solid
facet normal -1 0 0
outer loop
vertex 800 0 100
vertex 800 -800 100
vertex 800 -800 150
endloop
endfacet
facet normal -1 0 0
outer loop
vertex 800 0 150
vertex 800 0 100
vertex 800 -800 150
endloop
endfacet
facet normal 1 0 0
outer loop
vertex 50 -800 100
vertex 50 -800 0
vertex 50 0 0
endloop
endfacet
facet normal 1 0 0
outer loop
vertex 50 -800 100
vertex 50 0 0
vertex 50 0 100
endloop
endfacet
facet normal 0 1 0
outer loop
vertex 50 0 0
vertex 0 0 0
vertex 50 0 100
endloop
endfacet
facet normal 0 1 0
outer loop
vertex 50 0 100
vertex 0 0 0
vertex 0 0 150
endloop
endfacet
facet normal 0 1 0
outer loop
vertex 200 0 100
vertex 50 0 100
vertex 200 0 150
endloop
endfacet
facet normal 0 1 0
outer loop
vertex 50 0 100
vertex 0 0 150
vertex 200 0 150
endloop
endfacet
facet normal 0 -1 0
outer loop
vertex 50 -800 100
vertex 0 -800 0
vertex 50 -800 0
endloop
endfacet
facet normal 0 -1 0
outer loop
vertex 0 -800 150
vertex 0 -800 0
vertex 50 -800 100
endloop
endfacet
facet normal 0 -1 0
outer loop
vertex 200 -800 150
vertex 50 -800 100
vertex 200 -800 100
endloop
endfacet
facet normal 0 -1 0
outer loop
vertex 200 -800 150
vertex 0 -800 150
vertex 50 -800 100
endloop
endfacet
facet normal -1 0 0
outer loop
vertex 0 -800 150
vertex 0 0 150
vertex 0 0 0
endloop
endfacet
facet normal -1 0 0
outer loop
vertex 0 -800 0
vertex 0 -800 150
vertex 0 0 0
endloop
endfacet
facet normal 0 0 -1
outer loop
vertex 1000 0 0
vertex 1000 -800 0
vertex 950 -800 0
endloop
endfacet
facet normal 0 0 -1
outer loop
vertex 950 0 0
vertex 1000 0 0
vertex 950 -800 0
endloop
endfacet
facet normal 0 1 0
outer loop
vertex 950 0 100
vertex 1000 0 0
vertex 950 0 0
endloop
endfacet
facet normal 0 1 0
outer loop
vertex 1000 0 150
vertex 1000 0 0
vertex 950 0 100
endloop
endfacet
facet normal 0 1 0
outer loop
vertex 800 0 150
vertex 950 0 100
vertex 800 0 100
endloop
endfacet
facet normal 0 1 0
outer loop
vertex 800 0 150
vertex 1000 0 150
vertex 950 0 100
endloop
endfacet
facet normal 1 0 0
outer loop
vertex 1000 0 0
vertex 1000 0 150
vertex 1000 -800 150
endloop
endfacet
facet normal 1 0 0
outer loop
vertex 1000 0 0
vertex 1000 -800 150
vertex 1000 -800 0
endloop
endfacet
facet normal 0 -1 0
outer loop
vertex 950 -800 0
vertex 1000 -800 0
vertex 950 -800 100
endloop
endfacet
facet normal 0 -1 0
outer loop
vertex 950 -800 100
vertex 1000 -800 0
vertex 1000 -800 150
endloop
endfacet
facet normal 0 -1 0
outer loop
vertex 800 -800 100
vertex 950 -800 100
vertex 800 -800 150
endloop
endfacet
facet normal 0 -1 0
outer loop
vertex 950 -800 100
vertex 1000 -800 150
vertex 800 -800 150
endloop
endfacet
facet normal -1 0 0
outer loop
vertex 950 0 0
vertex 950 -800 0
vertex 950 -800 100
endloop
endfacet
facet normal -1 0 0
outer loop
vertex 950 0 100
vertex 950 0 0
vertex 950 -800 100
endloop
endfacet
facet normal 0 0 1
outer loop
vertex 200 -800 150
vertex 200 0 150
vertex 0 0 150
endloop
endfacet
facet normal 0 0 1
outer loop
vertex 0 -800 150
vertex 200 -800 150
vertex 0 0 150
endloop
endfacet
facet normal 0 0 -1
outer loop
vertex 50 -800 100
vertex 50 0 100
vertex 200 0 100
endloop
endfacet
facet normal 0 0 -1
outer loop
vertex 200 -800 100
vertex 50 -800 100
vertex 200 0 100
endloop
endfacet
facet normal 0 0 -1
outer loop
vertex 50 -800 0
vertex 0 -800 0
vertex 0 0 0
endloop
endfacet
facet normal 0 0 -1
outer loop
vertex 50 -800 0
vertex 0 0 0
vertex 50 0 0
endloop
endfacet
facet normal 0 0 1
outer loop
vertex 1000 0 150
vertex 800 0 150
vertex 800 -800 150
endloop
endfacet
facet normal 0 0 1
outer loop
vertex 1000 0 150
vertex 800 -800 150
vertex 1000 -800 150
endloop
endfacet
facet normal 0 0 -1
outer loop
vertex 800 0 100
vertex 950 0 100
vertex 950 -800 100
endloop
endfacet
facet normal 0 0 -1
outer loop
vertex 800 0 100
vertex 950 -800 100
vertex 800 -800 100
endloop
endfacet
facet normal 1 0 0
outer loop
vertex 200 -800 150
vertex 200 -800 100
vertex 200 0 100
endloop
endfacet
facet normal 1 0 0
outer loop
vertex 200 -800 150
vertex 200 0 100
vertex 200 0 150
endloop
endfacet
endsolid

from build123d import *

# Parameters (mm, degrees)
F1_DEPTH = 800


with BuildPart() as f1:
    # F0 (on Front) → F1 (new body)
    with BuildSketch(Plane.XZ):
        Polygon((0, 150), (0, 0), (50, 0), (50, 100), (200, 100), (200, 150), align=None)
    extrude(amount=F1_DEPTH)


with BuildPart() as f3_1:
    # F3: instance of F1
    add(f1.part.mirror(Plane(origin=(500, -400, 125), x_dir=(0, 1, 0), z_dir=(1, 0, 0))))


solid = Compound([f1.part, f3_1.part])
